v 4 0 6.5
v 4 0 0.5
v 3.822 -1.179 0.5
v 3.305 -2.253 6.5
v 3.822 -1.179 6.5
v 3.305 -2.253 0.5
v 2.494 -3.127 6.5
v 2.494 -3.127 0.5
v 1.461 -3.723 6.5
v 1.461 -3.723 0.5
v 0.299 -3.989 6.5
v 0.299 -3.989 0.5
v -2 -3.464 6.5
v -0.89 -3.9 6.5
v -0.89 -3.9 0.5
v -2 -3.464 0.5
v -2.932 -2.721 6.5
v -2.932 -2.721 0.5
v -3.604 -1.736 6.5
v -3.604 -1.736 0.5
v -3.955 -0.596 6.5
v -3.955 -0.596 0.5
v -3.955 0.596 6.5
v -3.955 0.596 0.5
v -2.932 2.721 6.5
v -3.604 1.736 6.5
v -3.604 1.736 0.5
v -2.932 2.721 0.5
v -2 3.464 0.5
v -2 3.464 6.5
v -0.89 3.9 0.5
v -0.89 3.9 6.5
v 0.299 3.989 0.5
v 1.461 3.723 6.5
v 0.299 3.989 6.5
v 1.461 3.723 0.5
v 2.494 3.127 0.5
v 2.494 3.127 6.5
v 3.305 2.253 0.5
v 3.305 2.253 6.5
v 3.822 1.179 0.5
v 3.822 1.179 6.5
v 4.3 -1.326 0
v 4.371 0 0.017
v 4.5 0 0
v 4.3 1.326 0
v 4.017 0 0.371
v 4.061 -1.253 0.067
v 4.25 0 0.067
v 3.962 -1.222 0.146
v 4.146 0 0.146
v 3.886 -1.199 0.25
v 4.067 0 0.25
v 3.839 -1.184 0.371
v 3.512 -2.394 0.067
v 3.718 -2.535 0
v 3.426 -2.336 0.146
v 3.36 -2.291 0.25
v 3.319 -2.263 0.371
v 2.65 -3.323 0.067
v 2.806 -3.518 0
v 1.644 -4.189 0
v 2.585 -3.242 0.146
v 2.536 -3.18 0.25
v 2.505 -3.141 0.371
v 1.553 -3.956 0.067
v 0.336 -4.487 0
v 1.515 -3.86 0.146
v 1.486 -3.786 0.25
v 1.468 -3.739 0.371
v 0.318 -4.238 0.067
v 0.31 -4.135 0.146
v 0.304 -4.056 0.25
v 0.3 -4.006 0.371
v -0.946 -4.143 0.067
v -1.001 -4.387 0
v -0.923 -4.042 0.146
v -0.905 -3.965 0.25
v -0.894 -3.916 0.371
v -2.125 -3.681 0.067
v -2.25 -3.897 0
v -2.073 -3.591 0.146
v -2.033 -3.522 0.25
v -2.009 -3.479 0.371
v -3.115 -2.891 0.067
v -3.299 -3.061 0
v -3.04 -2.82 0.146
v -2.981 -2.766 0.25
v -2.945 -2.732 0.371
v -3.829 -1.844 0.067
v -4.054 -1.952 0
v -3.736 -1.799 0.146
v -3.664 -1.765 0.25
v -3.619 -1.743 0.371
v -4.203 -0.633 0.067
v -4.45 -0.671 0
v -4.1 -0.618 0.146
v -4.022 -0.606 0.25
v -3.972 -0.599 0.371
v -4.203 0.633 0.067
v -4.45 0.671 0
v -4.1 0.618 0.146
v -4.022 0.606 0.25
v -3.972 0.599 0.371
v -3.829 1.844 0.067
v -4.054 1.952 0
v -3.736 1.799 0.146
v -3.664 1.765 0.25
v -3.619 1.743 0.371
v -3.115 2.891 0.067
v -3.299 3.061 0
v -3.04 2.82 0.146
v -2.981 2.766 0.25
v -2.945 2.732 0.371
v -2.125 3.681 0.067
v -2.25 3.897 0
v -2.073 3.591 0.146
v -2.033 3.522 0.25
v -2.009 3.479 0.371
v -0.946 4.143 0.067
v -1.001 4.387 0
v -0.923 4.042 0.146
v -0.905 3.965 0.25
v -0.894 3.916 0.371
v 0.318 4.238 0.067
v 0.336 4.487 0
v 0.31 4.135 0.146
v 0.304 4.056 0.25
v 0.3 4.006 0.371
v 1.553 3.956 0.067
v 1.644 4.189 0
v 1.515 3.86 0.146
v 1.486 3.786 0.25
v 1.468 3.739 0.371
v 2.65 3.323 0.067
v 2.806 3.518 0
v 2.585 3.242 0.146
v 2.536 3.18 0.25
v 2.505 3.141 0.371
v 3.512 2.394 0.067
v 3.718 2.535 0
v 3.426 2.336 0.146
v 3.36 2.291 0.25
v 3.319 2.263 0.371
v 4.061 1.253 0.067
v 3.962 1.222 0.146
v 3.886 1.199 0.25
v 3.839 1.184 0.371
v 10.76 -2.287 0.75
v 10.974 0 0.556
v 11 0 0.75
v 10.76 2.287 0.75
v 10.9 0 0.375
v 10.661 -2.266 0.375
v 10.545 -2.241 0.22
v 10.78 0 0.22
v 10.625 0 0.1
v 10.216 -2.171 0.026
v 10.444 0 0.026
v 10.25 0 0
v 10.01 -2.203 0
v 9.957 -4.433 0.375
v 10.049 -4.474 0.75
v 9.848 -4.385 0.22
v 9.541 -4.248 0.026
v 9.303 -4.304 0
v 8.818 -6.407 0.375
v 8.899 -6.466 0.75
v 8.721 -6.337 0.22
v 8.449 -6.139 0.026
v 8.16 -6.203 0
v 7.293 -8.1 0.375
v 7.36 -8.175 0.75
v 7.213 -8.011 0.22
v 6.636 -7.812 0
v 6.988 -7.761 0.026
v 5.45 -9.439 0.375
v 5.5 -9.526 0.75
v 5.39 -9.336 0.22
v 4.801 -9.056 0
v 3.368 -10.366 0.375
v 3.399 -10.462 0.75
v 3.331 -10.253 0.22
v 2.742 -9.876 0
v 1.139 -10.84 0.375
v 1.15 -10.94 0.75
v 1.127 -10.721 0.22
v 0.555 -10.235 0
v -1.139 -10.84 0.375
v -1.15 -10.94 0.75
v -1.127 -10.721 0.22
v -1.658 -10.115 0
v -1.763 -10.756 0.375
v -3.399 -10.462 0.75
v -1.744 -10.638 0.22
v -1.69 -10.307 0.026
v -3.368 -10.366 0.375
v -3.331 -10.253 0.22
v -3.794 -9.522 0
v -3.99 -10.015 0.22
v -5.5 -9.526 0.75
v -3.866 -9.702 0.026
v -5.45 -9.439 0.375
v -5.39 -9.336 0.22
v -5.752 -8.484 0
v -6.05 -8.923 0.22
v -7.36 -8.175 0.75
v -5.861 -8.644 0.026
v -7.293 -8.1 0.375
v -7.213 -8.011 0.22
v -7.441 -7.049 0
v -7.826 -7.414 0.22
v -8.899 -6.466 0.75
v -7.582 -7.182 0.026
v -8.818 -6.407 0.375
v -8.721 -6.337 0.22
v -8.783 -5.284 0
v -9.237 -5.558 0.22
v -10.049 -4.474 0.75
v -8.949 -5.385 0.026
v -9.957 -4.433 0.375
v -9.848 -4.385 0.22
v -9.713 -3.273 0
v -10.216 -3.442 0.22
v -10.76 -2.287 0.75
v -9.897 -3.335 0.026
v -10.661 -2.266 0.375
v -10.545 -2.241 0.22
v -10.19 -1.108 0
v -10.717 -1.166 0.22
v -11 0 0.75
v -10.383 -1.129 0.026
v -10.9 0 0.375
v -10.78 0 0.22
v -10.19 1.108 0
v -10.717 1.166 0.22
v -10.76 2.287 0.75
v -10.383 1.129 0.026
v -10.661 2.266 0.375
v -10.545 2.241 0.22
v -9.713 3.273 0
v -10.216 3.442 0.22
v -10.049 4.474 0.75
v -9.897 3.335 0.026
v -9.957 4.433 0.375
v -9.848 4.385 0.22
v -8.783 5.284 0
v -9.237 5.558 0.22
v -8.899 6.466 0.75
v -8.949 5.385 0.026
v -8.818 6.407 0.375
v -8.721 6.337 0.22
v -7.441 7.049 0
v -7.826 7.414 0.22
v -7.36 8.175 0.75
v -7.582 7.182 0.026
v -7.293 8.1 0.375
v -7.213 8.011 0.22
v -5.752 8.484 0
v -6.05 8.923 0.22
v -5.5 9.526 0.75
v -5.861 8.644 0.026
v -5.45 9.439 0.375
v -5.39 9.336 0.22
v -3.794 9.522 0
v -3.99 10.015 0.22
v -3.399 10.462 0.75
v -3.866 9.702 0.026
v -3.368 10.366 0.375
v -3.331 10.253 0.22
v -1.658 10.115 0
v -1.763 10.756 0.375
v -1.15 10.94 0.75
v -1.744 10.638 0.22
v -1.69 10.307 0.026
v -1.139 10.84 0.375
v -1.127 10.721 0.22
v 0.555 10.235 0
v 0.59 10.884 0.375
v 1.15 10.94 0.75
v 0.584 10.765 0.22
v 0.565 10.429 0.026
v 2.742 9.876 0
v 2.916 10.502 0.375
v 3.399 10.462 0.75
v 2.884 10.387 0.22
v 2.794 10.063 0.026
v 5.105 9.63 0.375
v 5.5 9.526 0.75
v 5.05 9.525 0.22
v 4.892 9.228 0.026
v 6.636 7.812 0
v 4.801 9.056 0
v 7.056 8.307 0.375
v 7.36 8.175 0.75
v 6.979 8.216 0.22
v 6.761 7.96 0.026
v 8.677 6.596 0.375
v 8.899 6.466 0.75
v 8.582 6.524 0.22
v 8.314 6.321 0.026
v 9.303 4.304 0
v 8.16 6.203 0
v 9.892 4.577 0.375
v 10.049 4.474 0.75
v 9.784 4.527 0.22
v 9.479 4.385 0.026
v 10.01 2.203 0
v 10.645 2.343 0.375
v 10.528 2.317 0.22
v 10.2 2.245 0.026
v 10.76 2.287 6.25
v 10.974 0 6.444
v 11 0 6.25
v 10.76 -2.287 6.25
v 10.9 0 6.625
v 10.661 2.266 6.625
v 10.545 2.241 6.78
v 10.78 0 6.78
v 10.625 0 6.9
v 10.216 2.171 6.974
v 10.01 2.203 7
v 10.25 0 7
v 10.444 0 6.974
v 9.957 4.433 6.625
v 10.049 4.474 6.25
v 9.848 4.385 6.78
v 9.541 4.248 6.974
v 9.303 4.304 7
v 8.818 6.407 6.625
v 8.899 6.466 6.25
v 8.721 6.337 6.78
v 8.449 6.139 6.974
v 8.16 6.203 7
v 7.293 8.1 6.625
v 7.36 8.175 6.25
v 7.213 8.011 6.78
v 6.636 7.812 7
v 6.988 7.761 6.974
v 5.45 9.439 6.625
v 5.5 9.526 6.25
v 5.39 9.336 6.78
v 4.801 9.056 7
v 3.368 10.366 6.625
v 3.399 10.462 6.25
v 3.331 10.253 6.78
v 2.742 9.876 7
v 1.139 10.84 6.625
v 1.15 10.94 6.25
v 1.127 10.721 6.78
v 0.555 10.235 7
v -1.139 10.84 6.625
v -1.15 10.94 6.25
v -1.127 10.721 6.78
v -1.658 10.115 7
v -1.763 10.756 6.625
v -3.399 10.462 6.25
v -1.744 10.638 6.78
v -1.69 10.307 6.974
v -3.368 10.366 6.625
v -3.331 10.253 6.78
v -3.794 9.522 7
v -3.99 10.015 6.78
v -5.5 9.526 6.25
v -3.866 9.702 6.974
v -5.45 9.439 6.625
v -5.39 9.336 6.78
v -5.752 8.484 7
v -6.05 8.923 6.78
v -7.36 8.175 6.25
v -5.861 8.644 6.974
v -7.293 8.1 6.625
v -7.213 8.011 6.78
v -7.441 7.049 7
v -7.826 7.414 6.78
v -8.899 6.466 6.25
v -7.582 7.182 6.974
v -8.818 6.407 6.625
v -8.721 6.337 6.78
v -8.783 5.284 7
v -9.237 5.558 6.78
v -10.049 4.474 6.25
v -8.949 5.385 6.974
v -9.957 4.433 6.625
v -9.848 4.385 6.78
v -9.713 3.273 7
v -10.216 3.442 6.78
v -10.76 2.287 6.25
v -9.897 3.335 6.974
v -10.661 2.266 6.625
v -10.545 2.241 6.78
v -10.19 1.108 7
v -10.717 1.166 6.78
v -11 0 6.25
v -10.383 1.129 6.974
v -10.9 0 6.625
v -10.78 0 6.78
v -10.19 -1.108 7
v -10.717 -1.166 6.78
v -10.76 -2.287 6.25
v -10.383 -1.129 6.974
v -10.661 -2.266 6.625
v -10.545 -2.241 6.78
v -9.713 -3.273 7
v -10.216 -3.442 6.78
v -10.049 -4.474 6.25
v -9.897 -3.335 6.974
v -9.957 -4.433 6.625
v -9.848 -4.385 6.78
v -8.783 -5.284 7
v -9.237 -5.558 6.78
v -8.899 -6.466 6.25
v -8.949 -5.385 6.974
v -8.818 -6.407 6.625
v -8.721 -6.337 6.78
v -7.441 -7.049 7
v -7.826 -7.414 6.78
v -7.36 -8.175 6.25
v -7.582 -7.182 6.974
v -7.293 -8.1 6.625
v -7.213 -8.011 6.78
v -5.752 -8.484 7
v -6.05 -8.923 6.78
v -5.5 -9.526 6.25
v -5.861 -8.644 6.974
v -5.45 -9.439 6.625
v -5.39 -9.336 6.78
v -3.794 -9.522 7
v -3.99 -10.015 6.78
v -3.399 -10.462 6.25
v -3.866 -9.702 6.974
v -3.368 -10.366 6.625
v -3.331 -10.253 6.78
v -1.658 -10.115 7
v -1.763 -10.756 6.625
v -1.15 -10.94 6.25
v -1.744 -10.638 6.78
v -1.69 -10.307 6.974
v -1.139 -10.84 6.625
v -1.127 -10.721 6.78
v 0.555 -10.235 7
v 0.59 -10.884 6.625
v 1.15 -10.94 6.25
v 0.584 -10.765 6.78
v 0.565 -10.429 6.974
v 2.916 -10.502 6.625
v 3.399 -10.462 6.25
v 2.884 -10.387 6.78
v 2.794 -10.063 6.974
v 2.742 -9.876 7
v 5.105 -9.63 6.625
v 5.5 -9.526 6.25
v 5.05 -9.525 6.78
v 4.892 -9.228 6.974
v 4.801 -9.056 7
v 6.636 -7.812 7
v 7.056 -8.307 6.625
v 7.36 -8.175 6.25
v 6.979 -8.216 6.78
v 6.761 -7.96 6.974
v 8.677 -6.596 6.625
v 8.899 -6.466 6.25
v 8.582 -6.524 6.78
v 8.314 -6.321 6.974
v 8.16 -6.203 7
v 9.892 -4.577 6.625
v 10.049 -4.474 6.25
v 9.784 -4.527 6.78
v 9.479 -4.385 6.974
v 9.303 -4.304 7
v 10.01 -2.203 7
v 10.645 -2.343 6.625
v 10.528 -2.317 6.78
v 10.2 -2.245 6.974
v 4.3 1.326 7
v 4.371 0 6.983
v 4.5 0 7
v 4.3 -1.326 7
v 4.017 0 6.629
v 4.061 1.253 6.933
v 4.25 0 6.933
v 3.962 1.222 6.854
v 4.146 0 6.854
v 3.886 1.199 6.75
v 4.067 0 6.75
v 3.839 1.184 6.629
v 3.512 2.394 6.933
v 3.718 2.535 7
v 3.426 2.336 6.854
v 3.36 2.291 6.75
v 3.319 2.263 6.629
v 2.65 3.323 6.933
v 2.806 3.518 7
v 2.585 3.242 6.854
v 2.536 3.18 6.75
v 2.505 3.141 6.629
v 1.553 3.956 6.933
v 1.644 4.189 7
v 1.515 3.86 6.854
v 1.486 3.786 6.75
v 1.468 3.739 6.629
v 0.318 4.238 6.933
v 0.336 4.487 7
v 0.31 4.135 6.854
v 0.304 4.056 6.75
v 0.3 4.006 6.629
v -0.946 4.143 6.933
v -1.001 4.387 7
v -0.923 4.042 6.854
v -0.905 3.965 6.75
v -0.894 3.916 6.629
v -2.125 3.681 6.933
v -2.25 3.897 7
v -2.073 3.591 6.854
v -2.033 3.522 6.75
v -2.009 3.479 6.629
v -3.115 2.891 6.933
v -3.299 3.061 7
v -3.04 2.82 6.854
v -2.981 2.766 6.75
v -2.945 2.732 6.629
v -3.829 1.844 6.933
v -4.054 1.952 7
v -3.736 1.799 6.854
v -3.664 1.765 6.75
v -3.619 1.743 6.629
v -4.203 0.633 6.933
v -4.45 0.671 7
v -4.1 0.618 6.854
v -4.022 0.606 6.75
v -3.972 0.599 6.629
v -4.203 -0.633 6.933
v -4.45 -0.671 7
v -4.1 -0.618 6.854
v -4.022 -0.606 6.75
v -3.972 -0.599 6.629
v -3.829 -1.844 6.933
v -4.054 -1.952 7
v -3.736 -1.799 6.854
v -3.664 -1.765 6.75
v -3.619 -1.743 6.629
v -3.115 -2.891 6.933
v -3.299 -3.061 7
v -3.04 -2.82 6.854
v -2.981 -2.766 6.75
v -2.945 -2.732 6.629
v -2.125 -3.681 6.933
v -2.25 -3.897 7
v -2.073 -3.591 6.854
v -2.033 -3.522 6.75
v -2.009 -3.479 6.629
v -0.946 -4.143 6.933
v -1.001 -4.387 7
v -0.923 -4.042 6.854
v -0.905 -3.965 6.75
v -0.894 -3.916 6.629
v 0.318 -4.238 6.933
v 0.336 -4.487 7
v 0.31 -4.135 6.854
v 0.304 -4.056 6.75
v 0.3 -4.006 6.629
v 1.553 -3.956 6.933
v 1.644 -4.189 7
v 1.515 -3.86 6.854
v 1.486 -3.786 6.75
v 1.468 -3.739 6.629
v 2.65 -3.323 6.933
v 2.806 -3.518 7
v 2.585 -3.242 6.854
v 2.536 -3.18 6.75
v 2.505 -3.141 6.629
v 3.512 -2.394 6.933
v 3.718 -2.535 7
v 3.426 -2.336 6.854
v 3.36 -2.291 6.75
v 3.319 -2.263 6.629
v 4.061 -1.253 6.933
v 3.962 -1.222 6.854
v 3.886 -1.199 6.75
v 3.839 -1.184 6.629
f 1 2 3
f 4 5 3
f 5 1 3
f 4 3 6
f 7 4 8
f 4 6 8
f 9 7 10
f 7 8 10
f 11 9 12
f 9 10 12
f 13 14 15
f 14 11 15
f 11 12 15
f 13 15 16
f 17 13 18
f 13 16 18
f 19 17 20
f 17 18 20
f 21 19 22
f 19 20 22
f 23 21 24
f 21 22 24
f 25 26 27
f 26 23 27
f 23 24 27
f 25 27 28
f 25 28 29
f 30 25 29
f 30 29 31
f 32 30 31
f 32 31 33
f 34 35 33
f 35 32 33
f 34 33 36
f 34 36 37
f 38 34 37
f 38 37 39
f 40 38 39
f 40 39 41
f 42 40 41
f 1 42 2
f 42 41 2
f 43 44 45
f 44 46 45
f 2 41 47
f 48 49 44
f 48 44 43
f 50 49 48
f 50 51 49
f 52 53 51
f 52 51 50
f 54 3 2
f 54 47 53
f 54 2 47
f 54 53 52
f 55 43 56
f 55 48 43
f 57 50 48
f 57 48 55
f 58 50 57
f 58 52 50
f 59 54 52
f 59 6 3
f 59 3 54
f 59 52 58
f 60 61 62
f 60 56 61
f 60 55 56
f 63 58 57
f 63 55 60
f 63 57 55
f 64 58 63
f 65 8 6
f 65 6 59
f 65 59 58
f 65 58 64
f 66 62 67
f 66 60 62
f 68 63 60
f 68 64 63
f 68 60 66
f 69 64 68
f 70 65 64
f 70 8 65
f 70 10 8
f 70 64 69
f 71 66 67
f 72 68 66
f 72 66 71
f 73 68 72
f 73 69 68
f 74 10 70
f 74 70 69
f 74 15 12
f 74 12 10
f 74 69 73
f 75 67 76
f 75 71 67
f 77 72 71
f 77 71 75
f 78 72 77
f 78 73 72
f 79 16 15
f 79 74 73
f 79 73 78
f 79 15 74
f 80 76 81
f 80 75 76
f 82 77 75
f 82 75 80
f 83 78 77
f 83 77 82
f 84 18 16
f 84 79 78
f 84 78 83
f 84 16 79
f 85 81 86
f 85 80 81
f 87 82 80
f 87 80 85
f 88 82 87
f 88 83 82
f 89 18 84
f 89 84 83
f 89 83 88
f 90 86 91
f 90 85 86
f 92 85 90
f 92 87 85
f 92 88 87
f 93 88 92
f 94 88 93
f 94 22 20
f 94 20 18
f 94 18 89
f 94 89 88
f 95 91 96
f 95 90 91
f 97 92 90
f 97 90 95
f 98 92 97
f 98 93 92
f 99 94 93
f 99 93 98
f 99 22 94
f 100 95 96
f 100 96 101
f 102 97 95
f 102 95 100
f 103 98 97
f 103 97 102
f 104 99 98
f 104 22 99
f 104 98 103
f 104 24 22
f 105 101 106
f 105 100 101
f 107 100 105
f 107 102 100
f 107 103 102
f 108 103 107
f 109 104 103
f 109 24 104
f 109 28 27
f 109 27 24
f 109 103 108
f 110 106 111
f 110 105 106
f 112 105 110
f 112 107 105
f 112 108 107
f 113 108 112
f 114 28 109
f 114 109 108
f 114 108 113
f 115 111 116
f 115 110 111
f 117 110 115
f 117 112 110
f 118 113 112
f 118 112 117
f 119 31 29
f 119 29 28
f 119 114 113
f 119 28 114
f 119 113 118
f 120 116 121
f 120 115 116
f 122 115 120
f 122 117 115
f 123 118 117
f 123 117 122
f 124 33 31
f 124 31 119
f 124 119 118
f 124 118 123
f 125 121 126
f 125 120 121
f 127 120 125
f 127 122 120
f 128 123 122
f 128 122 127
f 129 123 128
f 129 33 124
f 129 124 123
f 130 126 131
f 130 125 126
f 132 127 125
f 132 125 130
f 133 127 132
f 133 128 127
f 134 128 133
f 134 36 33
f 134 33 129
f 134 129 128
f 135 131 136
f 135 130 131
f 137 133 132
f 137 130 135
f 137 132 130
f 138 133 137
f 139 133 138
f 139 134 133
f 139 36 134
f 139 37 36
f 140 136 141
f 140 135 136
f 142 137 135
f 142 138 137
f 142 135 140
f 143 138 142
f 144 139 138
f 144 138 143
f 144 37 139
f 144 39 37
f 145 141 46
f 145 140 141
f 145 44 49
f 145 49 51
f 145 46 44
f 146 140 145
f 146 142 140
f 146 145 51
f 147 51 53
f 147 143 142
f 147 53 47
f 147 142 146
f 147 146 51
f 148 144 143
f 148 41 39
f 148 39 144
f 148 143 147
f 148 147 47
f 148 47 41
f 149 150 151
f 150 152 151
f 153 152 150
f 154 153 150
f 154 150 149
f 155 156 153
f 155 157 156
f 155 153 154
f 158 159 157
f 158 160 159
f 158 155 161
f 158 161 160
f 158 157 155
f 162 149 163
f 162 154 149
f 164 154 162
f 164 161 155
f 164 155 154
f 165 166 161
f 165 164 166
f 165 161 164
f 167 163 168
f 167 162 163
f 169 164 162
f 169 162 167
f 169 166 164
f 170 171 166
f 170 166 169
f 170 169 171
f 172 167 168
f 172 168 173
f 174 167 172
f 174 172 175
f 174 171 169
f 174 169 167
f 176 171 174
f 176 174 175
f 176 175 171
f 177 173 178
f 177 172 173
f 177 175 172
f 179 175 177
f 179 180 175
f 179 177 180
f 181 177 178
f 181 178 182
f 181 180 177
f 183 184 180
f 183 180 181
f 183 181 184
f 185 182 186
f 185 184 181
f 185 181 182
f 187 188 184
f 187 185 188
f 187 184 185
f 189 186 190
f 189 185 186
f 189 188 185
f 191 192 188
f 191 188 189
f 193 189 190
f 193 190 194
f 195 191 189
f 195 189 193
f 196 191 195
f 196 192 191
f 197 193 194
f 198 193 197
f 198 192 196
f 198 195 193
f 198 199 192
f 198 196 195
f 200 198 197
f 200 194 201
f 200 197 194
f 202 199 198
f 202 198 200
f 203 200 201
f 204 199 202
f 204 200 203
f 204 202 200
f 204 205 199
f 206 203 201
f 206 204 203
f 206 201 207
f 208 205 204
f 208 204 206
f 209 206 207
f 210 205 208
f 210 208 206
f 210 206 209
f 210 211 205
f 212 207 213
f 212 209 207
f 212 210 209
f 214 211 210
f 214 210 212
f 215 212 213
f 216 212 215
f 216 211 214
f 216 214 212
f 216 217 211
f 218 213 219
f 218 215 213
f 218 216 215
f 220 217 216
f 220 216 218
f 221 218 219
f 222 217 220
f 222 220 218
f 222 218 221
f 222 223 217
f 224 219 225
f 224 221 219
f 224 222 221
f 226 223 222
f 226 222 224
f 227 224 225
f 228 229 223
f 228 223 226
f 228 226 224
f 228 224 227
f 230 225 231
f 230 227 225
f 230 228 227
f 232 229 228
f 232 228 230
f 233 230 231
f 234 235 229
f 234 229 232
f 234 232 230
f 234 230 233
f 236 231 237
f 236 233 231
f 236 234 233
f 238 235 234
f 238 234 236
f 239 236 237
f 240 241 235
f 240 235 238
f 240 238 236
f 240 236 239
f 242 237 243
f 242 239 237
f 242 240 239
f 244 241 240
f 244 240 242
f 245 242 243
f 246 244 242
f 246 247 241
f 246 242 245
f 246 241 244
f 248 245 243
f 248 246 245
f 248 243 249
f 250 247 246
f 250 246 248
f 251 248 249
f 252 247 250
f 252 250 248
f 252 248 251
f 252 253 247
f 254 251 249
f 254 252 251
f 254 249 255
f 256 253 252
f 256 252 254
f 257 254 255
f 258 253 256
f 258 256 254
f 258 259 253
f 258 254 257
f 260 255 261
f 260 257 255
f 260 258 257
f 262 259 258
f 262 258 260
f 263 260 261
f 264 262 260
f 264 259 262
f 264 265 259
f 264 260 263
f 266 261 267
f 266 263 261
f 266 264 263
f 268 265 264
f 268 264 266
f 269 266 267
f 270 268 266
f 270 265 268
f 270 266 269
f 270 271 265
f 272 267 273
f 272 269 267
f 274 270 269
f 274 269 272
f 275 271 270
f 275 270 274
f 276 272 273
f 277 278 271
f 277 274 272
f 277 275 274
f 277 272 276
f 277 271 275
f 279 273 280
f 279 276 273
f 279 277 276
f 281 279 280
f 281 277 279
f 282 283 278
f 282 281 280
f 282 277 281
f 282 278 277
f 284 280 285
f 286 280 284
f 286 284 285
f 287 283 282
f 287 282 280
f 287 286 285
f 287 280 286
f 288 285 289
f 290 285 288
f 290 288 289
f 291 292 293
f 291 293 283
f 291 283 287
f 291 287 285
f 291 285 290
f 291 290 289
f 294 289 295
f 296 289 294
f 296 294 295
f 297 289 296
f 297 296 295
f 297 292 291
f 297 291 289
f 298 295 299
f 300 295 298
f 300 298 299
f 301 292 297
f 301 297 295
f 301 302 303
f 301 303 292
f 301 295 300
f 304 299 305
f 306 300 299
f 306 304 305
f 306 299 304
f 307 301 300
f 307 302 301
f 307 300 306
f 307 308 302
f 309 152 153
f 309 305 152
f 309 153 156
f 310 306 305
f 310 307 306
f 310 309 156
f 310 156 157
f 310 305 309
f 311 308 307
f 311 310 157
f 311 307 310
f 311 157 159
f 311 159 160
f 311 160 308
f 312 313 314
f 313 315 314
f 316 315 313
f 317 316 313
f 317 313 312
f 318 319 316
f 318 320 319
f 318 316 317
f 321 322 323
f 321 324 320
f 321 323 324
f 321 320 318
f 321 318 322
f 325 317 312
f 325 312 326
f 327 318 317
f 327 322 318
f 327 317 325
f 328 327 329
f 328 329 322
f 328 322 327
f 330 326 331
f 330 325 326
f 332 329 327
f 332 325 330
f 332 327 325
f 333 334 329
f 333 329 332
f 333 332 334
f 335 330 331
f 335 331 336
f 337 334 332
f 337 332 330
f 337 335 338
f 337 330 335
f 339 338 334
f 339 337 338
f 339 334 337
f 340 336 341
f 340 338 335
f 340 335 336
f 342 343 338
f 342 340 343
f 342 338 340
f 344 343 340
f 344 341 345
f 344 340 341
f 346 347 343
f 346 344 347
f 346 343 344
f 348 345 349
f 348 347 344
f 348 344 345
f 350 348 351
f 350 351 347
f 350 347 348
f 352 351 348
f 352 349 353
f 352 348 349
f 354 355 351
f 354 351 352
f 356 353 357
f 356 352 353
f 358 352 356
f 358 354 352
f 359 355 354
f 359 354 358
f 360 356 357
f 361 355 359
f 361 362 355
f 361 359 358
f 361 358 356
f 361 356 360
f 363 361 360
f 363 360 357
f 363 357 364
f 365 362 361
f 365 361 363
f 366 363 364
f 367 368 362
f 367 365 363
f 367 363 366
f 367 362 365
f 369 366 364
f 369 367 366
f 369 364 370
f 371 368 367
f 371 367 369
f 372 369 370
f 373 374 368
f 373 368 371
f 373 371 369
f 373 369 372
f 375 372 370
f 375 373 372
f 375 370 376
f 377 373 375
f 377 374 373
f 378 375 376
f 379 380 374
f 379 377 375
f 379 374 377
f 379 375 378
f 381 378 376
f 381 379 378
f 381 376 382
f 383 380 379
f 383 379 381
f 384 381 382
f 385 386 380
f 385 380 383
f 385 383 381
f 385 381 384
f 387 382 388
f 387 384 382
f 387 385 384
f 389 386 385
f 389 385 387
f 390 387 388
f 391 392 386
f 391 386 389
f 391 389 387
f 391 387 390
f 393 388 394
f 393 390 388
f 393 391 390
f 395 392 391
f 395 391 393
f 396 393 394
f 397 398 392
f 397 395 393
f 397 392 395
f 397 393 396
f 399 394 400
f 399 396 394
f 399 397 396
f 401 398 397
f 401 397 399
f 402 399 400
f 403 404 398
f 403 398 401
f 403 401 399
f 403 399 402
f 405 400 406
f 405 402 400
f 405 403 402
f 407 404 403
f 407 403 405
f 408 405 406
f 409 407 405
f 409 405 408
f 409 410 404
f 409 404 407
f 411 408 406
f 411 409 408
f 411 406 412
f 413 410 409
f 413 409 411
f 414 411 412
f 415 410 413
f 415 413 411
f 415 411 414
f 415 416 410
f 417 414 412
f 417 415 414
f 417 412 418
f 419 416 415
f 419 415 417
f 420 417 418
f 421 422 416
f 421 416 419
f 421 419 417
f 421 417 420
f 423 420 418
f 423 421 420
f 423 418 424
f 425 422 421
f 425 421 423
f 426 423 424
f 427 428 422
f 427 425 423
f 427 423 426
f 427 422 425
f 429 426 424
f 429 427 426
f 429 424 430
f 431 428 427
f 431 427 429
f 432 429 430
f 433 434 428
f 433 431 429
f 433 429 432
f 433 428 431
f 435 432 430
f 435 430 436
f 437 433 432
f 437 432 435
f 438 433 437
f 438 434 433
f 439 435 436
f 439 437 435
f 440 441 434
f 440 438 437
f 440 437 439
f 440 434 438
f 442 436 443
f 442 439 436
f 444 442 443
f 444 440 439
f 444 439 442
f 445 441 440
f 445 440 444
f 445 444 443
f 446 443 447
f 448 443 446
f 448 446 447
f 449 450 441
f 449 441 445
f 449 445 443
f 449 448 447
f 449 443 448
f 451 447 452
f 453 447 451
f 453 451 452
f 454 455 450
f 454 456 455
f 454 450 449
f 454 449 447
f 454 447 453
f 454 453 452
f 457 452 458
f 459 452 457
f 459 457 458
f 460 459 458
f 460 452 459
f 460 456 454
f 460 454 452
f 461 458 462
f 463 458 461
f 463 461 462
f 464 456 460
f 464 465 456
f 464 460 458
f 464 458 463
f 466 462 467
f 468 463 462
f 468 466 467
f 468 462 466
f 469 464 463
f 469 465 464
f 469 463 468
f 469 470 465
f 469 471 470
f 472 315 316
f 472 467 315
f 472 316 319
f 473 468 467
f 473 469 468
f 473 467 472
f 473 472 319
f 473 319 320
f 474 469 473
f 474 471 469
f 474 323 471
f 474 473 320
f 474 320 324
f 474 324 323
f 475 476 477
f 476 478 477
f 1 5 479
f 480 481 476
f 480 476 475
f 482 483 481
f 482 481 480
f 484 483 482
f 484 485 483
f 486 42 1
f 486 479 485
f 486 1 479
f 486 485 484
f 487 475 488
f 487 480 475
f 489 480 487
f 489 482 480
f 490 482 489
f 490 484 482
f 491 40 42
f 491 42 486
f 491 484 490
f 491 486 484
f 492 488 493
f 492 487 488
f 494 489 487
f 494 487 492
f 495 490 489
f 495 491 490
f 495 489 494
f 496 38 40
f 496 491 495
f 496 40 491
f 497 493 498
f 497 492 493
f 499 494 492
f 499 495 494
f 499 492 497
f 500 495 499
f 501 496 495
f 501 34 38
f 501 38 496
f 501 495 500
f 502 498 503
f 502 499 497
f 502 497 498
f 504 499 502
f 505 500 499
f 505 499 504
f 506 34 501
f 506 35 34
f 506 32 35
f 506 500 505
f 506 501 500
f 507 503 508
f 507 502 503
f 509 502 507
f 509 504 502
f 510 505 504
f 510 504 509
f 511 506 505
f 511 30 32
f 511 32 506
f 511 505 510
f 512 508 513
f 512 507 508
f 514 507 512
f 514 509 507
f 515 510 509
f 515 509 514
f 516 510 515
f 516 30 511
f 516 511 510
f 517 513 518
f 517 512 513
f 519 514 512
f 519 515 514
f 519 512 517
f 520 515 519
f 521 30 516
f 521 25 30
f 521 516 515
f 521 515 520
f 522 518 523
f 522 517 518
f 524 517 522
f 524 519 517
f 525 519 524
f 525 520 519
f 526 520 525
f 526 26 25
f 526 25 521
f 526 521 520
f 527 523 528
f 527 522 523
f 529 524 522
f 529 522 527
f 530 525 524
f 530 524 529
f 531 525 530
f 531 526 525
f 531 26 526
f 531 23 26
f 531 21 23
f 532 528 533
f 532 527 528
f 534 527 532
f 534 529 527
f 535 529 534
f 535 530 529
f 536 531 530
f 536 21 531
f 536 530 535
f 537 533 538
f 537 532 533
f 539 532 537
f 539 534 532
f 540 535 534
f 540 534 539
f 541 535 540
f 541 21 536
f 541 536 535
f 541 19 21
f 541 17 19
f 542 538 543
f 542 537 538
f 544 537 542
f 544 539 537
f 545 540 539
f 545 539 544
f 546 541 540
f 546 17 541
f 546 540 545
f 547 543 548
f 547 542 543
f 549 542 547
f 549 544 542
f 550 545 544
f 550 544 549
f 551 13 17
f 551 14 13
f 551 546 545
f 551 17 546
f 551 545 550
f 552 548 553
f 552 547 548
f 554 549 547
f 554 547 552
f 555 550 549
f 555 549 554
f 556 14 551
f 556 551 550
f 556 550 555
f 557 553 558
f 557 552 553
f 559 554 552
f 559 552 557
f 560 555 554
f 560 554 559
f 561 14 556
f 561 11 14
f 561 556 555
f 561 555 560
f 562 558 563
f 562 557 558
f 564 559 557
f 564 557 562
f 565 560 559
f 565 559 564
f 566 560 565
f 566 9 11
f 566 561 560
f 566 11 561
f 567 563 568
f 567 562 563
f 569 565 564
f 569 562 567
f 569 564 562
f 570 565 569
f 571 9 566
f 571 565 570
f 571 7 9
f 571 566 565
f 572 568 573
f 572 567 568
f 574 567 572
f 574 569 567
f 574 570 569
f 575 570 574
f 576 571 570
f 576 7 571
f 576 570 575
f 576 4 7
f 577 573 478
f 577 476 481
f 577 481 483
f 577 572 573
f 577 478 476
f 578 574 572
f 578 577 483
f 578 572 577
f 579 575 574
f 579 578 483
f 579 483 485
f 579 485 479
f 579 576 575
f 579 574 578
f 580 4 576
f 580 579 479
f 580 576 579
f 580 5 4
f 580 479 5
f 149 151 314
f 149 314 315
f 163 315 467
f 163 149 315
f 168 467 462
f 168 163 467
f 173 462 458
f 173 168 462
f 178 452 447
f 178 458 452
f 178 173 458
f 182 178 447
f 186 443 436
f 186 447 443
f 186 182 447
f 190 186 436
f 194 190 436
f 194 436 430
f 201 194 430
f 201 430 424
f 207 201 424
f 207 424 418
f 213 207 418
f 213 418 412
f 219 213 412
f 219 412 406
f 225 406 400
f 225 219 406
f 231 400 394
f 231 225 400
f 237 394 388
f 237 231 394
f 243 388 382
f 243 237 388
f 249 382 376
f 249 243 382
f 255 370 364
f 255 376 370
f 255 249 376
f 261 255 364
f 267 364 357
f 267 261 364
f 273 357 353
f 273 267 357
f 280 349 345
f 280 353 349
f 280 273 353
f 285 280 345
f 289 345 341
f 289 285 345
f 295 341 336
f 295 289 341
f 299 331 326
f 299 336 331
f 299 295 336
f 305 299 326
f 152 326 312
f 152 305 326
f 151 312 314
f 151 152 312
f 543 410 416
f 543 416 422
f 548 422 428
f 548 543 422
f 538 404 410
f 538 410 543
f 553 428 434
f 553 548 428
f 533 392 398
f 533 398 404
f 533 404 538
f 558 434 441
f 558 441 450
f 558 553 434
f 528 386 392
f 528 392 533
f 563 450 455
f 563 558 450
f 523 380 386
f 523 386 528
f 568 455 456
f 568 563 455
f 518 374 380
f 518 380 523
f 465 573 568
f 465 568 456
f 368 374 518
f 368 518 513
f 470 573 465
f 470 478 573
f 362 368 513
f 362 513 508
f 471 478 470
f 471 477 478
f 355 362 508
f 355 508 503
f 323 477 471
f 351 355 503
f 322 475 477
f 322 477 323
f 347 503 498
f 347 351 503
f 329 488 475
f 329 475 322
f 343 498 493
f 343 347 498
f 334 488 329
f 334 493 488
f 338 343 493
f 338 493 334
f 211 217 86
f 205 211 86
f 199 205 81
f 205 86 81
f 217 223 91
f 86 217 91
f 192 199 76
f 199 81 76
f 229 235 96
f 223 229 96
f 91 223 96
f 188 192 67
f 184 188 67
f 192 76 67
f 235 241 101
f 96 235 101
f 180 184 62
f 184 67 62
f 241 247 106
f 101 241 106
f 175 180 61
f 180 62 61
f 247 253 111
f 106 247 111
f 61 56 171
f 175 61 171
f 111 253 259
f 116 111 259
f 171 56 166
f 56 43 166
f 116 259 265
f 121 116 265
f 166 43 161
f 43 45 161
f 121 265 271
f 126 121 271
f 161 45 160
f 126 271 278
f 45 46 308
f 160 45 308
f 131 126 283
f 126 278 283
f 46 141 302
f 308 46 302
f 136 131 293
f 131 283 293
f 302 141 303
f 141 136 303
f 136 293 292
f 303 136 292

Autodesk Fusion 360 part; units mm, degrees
sketch "Sketch1" plane through (0, 0, 0) normal (0, 0, 1) x (1, 0, 0)
  circle A0 centre (0, 0) radius 11
  circle A1 centre (0, 0) radius 4
  dimension "d1" = 22
  dimension "d2" = 8
extrude "Extrude1" add sketch "Sketch1" along normal blind 7
fillet "Fillet1" radius 0.75 2 edges at (-10.2556, -3.9778, 7) (-10.2556, -3.9778, 0)
fillet "Fillet2" radius 0.5 2 edges at (-3.7293, 1.4465, 7) (-3.7293, 1.4465, 0)
